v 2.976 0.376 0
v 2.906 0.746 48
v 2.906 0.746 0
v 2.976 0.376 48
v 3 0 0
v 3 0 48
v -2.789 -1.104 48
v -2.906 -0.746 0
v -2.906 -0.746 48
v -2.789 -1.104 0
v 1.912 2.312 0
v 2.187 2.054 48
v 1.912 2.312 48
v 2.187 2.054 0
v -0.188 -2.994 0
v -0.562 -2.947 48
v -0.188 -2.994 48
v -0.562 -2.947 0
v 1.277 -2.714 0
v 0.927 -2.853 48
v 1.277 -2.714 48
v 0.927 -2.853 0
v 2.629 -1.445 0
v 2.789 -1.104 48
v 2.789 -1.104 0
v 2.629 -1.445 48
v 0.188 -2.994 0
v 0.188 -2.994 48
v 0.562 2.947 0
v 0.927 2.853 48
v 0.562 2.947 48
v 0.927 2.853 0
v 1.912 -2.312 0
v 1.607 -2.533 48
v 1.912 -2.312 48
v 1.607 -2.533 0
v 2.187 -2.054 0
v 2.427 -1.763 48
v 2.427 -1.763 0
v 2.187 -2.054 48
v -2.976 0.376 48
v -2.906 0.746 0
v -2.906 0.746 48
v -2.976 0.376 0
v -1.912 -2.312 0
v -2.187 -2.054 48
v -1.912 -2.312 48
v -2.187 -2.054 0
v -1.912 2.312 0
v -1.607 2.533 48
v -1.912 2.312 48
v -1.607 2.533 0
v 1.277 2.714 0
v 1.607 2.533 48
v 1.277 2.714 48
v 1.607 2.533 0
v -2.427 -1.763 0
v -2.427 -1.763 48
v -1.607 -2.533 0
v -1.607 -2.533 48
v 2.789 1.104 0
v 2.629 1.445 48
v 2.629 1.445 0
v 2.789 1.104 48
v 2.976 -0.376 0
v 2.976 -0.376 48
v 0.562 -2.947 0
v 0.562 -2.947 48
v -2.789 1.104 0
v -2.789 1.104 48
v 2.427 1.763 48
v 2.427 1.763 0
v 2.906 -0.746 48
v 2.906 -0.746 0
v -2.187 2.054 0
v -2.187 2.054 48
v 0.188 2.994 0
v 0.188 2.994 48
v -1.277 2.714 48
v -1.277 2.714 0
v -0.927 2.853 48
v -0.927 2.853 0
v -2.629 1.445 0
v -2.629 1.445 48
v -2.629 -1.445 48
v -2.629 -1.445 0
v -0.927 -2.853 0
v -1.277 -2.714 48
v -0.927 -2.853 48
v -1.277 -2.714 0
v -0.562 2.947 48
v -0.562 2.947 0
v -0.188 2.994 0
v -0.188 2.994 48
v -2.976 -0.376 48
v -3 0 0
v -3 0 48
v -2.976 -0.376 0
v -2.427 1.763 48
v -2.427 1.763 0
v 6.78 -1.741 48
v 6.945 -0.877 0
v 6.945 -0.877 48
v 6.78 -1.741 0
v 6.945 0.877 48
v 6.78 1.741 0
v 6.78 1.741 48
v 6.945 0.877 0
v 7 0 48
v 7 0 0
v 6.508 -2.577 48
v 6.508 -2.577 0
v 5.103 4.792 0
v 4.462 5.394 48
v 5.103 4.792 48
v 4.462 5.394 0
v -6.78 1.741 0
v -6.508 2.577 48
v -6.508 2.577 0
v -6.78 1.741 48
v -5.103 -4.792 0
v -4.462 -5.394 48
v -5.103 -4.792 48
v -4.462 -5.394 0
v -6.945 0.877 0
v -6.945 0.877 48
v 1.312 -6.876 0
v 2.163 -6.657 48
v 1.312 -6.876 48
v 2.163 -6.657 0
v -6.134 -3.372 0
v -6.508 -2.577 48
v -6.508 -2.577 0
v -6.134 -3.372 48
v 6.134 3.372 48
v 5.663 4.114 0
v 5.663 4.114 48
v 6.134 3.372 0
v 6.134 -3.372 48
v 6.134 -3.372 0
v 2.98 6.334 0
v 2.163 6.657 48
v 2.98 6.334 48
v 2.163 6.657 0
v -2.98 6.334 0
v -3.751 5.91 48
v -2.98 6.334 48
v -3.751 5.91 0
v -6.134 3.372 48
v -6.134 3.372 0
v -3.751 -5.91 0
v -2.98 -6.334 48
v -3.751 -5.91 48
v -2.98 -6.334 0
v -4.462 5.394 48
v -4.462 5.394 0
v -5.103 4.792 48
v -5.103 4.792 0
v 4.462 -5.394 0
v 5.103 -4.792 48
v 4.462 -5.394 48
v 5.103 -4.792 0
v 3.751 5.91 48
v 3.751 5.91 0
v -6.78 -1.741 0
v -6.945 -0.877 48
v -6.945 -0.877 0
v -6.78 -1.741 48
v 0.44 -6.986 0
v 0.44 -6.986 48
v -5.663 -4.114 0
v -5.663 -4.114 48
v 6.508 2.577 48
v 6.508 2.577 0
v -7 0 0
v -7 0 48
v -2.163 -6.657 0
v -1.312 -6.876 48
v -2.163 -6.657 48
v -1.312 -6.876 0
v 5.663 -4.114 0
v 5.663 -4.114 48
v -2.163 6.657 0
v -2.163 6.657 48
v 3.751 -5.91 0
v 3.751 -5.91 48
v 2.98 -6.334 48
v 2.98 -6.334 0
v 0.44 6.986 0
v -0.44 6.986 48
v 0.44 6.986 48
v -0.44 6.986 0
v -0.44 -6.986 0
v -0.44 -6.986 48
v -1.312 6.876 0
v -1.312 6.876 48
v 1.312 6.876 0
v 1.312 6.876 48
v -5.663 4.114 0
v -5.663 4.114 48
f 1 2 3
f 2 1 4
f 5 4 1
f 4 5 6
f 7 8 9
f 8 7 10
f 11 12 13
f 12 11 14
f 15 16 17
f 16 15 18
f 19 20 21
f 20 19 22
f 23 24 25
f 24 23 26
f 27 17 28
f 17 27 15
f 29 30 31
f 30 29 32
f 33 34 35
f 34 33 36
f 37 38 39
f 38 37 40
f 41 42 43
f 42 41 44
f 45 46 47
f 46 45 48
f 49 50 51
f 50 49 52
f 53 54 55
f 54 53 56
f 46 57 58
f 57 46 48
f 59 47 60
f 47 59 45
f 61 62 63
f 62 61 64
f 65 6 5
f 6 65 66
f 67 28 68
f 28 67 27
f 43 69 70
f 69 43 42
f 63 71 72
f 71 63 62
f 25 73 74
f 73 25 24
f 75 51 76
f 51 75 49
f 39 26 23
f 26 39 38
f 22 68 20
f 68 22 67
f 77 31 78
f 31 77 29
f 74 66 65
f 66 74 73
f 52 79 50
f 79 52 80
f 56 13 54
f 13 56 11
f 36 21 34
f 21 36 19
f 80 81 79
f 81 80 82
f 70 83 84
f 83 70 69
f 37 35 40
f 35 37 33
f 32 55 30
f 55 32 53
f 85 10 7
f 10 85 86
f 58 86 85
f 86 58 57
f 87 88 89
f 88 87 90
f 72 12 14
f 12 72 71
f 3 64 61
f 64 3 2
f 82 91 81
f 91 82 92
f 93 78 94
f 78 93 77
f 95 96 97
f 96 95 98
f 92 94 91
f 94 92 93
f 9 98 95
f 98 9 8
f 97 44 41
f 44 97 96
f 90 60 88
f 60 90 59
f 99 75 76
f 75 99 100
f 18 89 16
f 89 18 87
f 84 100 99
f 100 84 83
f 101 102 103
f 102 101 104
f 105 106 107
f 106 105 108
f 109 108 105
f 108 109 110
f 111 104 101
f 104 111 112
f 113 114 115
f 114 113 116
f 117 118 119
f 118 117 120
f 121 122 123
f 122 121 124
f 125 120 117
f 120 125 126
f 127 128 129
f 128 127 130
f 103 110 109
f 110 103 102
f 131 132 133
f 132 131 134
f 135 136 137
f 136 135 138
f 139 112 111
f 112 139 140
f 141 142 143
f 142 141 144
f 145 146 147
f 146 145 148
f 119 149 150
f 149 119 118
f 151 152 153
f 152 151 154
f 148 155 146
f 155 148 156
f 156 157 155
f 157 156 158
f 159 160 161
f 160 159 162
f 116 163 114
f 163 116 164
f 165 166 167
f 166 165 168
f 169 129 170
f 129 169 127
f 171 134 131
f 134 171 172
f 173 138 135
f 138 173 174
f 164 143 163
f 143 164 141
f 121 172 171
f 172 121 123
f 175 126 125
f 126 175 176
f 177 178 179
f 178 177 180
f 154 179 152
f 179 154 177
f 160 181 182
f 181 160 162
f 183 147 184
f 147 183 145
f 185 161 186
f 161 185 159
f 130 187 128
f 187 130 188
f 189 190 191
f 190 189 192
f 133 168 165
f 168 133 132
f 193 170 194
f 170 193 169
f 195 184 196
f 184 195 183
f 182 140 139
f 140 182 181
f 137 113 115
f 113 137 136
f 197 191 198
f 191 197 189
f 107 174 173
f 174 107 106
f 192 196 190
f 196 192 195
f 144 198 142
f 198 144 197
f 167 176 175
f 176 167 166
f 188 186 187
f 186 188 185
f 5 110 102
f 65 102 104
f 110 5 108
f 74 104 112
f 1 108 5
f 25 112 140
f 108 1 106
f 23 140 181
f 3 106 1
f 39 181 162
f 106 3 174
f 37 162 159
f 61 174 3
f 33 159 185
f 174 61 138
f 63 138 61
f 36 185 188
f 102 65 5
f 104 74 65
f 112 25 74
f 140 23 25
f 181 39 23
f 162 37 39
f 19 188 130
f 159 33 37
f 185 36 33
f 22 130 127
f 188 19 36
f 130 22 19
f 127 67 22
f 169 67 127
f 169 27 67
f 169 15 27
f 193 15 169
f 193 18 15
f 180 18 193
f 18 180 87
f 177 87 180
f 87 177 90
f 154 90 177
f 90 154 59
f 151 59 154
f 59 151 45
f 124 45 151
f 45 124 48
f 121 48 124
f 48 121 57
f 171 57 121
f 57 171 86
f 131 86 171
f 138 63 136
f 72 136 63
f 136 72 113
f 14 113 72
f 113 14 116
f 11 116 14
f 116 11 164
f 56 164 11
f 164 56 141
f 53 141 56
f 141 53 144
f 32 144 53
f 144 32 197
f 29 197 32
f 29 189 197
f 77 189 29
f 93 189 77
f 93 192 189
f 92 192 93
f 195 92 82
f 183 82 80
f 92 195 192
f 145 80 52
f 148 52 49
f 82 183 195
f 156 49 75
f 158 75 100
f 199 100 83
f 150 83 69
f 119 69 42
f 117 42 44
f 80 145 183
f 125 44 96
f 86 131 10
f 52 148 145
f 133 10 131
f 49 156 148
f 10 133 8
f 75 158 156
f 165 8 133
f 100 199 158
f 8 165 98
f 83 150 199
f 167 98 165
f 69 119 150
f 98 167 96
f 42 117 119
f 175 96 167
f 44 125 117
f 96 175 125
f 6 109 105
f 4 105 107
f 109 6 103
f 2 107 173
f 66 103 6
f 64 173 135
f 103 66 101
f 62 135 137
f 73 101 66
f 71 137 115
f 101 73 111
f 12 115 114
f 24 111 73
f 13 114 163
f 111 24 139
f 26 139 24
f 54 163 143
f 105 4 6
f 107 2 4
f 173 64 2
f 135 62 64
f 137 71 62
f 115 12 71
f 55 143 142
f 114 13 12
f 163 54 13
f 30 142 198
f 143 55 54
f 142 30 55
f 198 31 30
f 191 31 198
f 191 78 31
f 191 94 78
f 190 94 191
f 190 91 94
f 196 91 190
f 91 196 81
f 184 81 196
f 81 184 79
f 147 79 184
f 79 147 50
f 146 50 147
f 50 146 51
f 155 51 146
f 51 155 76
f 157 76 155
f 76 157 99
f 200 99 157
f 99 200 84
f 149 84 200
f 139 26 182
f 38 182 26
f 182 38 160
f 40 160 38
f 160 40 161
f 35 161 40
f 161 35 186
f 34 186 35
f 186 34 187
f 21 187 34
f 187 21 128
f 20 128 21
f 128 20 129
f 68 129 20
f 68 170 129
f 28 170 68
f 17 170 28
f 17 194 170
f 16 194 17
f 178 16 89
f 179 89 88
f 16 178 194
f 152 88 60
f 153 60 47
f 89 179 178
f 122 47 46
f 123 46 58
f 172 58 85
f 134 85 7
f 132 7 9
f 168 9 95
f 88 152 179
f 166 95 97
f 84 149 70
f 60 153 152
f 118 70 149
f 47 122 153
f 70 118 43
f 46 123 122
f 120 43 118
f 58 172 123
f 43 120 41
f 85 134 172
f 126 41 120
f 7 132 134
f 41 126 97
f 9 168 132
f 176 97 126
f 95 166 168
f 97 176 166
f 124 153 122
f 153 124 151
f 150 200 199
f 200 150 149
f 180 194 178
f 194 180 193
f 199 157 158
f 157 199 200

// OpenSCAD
$fn = 50;


difference() {
	union() {
		cylinder(h = 48, r = 7.0000000000);
	}
	union() {
		translate(v = [0, 0, -100]) {
			cylinder(h = 200, r = 3.0000000000);
		}
		translate(v = [0, 0, -100]) {
			cylinder(h = 200, r = 1.5000000000);
		}
	}
}
